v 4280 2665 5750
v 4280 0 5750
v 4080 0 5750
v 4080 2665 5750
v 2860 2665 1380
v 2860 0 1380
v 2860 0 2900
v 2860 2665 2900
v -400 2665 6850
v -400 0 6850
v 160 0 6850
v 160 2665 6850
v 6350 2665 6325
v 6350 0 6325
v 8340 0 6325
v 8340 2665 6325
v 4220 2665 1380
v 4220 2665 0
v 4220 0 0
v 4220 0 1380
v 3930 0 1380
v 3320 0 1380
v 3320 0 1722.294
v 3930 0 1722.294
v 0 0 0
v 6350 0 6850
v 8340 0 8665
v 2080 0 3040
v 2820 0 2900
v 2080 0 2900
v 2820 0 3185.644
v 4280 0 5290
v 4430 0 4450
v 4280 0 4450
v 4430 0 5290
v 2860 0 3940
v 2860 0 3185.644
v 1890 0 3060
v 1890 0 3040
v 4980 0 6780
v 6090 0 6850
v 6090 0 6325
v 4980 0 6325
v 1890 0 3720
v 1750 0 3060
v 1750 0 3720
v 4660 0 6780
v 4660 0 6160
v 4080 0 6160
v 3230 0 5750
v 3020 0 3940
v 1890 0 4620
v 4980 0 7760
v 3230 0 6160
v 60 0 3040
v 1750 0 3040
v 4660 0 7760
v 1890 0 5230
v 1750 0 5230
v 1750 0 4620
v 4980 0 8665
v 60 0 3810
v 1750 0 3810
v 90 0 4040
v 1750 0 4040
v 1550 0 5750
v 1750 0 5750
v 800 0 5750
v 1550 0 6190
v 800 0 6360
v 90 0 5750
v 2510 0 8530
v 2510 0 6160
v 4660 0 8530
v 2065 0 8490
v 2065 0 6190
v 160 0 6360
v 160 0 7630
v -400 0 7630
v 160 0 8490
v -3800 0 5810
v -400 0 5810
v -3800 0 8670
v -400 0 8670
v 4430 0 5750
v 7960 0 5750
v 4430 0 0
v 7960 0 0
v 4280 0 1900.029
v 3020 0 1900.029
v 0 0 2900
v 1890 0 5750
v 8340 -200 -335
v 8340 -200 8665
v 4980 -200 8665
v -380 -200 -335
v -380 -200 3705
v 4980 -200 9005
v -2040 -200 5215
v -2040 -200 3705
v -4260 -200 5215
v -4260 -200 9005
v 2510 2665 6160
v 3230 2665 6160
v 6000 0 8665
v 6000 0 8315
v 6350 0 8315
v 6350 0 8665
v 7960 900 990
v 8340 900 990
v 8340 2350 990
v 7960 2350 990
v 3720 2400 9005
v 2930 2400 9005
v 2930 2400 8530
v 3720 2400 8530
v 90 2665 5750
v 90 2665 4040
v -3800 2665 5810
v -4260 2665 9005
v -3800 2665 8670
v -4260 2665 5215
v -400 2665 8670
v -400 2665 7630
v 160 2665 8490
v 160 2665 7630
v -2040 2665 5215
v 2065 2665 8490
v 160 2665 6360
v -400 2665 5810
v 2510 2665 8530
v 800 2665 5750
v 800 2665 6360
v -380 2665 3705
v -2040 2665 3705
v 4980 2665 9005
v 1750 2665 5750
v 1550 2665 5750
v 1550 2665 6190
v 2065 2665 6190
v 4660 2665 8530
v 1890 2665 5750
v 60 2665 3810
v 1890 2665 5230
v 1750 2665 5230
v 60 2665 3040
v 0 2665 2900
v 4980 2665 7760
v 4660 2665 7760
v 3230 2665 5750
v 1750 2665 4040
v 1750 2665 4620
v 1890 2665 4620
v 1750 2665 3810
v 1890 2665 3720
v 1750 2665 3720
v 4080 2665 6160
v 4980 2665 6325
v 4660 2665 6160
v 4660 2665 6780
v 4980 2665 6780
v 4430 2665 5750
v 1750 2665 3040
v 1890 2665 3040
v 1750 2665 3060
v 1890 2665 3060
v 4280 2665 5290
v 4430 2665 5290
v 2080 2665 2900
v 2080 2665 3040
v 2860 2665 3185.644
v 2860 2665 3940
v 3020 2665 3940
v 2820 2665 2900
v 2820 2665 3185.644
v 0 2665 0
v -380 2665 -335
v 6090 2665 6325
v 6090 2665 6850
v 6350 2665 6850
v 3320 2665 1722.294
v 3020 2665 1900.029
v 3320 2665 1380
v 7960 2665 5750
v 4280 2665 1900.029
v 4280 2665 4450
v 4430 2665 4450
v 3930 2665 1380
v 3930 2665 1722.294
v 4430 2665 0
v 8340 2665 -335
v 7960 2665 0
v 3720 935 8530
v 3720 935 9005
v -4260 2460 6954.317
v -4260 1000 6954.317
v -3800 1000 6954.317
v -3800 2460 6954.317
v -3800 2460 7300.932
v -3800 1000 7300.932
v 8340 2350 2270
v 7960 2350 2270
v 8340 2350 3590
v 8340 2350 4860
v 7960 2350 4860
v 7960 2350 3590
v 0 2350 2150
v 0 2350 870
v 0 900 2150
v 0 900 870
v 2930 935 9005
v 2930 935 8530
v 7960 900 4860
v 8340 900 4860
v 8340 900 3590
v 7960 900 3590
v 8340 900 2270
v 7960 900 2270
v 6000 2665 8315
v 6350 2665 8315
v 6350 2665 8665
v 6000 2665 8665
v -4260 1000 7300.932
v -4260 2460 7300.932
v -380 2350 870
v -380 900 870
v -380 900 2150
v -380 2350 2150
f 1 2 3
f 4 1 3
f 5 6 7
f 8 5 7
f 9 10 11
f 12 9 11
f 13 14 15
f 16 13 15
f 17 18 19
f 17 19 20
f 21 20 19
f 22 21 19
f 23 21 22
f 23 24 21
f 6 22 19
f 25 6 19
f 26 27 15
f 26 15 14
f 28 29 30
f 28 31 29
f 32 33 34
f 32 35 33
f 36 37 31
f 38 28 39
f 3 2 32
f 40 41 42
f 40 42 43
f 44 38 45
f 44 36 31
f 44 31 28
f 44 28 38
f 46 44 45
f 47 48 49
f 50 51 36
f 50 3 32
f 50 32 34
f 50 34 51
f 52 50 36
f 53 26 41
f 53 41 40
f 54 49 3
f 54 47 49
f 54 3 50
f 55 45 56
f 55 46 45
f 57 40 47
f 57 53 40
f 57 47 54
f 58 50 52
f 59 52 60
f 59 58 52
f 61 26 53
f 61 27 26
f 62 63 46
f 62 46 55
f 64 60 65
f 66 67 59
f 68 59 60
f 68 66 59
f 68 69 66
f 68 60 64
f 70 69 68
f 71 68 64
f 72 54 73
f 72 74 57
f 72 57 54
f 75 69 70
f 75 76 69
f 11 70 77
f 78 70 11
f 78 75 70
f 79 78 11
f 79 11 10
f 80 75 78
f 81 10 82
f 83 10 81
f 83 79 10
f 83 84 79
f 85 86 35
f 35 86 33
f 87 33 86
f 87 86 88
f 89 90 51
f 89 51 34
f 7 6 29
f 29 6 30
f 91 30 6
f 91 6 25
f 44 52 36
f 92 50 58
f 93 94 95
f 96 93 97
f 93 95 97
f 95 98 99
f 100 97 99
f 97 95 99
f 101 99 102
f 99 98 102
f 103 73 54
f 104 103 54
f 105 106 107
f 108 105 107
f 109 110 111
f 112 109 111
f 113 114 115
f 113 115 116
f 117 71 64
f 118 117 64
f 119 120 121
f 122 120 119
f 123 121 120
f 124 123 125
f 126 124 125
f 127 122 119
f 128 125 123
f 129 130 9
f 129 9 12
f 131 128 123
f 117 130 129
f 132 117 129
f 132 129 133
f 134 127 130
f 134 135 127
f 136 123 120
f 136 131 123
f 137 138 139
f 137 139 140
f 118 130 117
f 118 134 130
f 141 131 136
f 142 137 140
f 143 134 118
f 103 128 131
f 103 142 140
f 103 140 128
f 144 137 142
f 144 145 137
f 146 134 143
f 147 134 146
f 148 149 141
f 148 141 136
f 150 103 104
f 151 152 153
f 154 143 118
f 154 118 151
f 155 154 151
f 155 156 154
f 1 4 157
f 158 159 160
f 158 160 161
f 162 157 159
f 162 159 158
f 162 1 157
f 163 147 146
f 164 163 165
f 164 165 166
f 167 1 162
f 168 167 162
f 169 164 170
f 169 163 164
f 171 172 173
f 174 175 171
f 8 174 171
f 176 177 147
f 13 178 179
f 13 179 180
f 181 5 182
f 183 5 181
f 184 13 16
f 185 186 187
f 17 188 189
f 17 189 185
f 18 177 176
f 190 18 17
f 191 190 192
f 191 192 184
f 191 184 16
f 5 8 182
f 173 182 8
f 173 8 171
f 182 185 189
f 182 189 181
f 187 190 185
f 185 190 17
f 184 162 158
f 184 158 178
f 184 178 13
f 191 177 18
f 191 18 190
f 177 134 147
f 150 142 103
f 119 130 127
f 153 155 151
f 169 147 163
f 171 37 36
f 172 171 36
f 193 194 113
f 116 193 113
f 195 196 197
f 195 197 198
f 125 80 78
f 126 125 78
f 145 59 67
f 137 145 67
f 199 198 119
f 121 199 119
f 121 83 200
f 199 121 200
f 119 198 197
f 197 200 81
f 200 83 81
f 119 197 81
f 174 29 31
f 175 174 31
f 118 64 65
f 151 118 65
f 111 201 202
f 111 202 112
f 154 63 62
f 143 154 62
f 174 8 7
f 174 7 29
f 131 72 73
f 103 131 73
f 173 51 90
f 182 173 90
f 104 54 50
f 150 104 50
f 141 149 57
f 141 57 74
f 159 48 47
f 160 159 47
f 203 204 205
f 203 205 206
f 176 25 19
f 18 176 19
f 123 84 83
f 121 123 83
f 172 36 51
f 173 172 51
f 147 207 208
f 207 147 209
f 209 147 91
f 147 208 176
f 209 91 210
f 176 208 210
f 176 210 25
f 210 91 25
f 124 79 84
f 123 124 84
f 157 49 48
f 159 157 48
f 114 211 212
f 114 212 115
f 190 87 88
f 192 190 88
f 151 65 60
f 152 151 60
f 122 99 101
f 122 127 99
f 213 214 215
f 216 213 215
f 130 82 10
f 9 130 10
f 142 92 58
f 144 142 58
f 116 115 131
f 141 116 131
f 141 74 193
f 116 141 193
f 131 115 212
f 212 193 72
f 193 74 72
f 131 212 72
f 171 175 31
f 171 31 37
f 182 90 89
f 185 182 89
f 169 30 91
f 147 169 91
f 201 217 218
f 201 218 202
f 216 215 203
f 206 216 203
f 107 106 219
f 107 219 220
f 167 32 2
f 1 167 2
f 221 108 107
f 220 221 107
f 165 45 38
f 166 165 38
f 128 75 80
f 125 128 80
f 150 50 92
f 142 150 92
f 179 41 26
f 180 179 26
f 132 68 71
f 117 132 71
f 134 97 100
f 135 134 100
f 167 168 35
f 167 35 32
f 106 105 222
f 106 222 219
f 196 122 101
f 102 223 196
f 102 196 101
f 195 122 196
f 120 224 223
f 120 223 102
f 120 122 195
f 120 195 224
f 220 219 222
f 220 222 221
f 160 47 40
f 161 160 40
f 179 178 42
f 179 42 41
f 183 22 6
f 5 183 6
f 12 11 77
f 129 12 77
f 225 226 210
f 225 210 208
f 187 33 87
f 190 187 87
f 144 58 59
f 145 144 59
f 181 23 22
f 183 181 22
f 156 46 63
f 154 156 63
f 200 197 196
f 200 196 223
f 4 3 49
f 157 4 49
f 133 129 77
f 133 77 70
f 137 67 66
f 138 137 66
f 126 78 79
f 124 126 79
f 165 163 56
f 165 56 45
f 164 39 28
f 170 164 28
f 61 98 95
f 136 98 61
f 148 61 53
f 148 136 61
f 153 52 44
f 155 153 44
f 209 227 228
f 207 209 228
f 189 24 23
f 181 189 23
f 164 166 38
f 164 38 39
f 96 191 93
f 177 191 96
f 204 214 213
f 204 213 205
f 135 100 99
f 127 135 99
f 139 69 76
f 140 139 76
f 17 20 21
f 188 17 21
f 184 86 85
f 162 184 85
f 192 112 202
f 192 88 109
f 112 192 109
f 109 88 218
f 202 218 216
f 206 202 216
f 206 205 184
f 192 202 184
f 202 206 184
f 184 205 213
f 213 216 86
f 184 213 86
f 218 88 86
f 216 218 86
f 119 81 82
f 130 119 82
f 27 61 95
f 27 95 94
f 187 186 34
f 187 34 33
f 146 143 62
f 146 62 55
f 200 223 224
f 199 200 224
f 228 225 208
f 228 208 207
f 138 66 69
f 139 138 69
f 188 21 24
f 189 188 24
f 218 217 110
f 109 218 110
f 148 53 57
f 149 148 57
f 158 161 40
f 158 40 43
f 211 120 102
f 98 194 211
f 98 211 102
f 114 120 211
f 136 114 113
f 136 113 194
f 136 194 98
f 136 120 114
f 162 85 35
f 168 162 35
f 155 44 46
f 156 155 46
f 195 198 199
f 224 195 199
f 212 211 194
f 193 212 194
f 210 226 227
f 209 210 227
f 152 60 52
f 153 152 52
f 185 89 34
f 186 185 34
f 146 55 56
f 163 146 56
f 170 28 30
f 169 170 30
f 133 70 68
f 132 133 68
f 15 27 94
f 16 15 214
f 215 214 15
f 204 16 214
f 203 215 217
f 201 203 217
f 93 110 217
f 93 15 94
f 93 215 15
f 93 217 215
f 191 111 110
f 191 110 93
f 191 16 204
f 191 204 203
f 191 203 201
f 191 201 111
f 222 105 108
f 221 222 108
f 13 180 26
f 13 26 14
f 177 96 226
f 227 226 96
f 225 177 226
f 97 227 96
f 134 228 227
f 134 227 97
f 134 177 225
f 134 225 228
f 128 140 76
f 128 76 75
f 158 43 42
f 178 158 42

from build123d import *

# Parameters (mm, degrees)
EXTRUDE_1_DEPTH     = 2665
SKETCH_1_W          = 350
SKETCH_1_H          = 350
EXTRUDE_1_2_DEPTH   = 2665
EXTRUDE_2_DEPTH     = 200
SKETCH_3_W          = 1270
SKETCH_3_H          = 1450
SKETCH_3_W_2        = 1280
CUT_EXTRUDE_1_DEPTH = 380
SKETCH_4_W          = 1280
SKETCH_4_H          = 1450
CUT_EXTRUDE_2_DEPTH = 380
SKETCH_5_W          = 346.615664156
SKETCH_5_H          = 1460
CUT_EXTRUDE_3_DEPTH = 460
SKETCH_6_W          = 790
SKETCH_6_H          = 1465
CUT_EXTRUDE_4_DEPTH = 475


with BuildPart() as part:
    # Эскиз1 → Бобышка-Вытянуть1 (new body)
    with BuildSketch(Plane(origin=(0, 0, 0), x_dir=(1, 0, 0), z_dir=(0, 1, 0))):
        Polygon((0, 0), (4220, 0), (4220, -1380), (3930, -1380), (3930, -1722.294402301), (3320, -1722.294402301), (3320, -1380), (2860, -1380), (2860, -2900), (2820, -2900), (2820, -3185.644376016), (2860, -3185.644376016), (2860, -3940), (3020, -3940), (3020, -1900.028681712), (4280, -1900.028681712), (4280, -4450), (4430, -4450), (4430, 0), (7960, 0), (7960, -5750), (4430, -5750), (4430, -5290), (4280, -5290), (4280, -5750), (4080, -5750), (4080, -6160), (4660, -6160), (4660, -6780), (4980, -6780), (4980, -6325), (6090, -6325), (6090, -6850), (6350, -6850), (6350, -6325), (8340, -6325), (8340, 335), (-380, 335), (-380, -3705), (-2040, -3705), (-2040, -5215), (-4260, -5215), (-4260, -9005), (4980, -9005), (4980, -7760), (4660, -7760), (4660, -8530), (2510, -8530), (2510, -6160), (3230, -6160), (3230, -5750), (1890, -5750), (1890, -5230), (1750, -5230), (1750, -5750), (1550, -5750), (1550, -6190), (2065, -6190), (2065, -8490), (160, -8490), (160, -7630), (-400, -7630), (-400, -8670), (-3800, -8670), (-3800, -5810), (-400, -5810), (-400, -6850), (160, -6850), (160, -6360), (723.669572164, -6360), (800, -6360), (800, -5750), (90, -5750), (90, -4040), (1750, -4040), (1750, -4620), (1890, -4620), (1890, -3720), (1750, -3720), (1750, -3810), (60, -3810), (60, -3040), (1750, -3040), (1750, -3060), (1890, -3060), (1890, -3040), (2080, -3040), (2080, -2900), (0, -2900), align=None)
    extrude(amount=EXTRUDE_1_DEPTH)

    # Эскиз2 → Бобышка-Вытянуть2 (add)
    with BuildSketch(Plane.XZ):
        Polygon((-4260, 5215), (-4260, 9005), (4980, 9005), (4980, 8665), (8340, 8665), (8340, -335), (-380, -335), (-380, 3705), (-2040, 3705), (-2040, 5215), align=None)
    extrude(amount=EXTRUDE_2_DEPTH)

    # Эскиз3 → Вырез-Вытянуть1 (cut)
    with BuildSketch(Plane(origin=(8340, 0, 0), x_dir=(0, 0, -1), z_dir=(1, 0, 0))):
        with Locations((-4225, 1625)):
            Rectangle(SKETCH_3_W, SKETCH_3_H)
        with Locations((-1630, 1625)):
            Rectangle(SKETCH_3_W_2, SKETCH_3_H)
    extrude(amount=-CUT_EXTRUDE_1_DEPTH, mode=Mode.SUBTRACT)

    # Эскиз4 → Вырез-Вытянуть2 (cut)
    with BuildSketch(Plane.ZY.offset(380)):
        with Locations((1510, 1625)):
            Rectangle(SKETCH_4_W, SKETCH_4_H)
    extrude(amount=-CUT_EXTRUDE_2_DEPTH, mode=Mode.SUBTRACT)

    # Эскиз5 → Вырез-Вытянуть3 (cut)
    with BuildSketch(Plane.ZY.offset(4260)):
        with Locations((7127.624496434, 1730)):
            Rectangle(SKETCH_5_W, SKETCH_5_H)
    extrude(amount=-CUT_EXTRUDE_3_DEPTH, mode=Mode.SUBTRACT)

    # Эскиз6 → Вырез-Вытянуть4 (cut)
    with BuildSketch(Plane.XY.offset(9005)):
        with Locations((3325, 1667.5)):
            Rectangle(SKETCH_6_W, SKETCH_6_H)
    extrude(amount=-CUT_EXTRUDE_4_DEPTH, mode=Mode.SUBTRACT)


with BuildPart() as body_2:
    # Эскиз1 → Extrude 1 2 (new body)
    with BuildSketch(Plane(origin=(0, 0, 0), x_dir=(1, 0, 0), z_dir=(0, 1, 0))):
        with Locations((6175, -8490)):
            Rectangle(SKETCH_1_W, SKETCH_1_H)
    extrude(amount=EXTRUDE_1_2_DEPTH)


solid = Compound([part.part, body_2.part])
